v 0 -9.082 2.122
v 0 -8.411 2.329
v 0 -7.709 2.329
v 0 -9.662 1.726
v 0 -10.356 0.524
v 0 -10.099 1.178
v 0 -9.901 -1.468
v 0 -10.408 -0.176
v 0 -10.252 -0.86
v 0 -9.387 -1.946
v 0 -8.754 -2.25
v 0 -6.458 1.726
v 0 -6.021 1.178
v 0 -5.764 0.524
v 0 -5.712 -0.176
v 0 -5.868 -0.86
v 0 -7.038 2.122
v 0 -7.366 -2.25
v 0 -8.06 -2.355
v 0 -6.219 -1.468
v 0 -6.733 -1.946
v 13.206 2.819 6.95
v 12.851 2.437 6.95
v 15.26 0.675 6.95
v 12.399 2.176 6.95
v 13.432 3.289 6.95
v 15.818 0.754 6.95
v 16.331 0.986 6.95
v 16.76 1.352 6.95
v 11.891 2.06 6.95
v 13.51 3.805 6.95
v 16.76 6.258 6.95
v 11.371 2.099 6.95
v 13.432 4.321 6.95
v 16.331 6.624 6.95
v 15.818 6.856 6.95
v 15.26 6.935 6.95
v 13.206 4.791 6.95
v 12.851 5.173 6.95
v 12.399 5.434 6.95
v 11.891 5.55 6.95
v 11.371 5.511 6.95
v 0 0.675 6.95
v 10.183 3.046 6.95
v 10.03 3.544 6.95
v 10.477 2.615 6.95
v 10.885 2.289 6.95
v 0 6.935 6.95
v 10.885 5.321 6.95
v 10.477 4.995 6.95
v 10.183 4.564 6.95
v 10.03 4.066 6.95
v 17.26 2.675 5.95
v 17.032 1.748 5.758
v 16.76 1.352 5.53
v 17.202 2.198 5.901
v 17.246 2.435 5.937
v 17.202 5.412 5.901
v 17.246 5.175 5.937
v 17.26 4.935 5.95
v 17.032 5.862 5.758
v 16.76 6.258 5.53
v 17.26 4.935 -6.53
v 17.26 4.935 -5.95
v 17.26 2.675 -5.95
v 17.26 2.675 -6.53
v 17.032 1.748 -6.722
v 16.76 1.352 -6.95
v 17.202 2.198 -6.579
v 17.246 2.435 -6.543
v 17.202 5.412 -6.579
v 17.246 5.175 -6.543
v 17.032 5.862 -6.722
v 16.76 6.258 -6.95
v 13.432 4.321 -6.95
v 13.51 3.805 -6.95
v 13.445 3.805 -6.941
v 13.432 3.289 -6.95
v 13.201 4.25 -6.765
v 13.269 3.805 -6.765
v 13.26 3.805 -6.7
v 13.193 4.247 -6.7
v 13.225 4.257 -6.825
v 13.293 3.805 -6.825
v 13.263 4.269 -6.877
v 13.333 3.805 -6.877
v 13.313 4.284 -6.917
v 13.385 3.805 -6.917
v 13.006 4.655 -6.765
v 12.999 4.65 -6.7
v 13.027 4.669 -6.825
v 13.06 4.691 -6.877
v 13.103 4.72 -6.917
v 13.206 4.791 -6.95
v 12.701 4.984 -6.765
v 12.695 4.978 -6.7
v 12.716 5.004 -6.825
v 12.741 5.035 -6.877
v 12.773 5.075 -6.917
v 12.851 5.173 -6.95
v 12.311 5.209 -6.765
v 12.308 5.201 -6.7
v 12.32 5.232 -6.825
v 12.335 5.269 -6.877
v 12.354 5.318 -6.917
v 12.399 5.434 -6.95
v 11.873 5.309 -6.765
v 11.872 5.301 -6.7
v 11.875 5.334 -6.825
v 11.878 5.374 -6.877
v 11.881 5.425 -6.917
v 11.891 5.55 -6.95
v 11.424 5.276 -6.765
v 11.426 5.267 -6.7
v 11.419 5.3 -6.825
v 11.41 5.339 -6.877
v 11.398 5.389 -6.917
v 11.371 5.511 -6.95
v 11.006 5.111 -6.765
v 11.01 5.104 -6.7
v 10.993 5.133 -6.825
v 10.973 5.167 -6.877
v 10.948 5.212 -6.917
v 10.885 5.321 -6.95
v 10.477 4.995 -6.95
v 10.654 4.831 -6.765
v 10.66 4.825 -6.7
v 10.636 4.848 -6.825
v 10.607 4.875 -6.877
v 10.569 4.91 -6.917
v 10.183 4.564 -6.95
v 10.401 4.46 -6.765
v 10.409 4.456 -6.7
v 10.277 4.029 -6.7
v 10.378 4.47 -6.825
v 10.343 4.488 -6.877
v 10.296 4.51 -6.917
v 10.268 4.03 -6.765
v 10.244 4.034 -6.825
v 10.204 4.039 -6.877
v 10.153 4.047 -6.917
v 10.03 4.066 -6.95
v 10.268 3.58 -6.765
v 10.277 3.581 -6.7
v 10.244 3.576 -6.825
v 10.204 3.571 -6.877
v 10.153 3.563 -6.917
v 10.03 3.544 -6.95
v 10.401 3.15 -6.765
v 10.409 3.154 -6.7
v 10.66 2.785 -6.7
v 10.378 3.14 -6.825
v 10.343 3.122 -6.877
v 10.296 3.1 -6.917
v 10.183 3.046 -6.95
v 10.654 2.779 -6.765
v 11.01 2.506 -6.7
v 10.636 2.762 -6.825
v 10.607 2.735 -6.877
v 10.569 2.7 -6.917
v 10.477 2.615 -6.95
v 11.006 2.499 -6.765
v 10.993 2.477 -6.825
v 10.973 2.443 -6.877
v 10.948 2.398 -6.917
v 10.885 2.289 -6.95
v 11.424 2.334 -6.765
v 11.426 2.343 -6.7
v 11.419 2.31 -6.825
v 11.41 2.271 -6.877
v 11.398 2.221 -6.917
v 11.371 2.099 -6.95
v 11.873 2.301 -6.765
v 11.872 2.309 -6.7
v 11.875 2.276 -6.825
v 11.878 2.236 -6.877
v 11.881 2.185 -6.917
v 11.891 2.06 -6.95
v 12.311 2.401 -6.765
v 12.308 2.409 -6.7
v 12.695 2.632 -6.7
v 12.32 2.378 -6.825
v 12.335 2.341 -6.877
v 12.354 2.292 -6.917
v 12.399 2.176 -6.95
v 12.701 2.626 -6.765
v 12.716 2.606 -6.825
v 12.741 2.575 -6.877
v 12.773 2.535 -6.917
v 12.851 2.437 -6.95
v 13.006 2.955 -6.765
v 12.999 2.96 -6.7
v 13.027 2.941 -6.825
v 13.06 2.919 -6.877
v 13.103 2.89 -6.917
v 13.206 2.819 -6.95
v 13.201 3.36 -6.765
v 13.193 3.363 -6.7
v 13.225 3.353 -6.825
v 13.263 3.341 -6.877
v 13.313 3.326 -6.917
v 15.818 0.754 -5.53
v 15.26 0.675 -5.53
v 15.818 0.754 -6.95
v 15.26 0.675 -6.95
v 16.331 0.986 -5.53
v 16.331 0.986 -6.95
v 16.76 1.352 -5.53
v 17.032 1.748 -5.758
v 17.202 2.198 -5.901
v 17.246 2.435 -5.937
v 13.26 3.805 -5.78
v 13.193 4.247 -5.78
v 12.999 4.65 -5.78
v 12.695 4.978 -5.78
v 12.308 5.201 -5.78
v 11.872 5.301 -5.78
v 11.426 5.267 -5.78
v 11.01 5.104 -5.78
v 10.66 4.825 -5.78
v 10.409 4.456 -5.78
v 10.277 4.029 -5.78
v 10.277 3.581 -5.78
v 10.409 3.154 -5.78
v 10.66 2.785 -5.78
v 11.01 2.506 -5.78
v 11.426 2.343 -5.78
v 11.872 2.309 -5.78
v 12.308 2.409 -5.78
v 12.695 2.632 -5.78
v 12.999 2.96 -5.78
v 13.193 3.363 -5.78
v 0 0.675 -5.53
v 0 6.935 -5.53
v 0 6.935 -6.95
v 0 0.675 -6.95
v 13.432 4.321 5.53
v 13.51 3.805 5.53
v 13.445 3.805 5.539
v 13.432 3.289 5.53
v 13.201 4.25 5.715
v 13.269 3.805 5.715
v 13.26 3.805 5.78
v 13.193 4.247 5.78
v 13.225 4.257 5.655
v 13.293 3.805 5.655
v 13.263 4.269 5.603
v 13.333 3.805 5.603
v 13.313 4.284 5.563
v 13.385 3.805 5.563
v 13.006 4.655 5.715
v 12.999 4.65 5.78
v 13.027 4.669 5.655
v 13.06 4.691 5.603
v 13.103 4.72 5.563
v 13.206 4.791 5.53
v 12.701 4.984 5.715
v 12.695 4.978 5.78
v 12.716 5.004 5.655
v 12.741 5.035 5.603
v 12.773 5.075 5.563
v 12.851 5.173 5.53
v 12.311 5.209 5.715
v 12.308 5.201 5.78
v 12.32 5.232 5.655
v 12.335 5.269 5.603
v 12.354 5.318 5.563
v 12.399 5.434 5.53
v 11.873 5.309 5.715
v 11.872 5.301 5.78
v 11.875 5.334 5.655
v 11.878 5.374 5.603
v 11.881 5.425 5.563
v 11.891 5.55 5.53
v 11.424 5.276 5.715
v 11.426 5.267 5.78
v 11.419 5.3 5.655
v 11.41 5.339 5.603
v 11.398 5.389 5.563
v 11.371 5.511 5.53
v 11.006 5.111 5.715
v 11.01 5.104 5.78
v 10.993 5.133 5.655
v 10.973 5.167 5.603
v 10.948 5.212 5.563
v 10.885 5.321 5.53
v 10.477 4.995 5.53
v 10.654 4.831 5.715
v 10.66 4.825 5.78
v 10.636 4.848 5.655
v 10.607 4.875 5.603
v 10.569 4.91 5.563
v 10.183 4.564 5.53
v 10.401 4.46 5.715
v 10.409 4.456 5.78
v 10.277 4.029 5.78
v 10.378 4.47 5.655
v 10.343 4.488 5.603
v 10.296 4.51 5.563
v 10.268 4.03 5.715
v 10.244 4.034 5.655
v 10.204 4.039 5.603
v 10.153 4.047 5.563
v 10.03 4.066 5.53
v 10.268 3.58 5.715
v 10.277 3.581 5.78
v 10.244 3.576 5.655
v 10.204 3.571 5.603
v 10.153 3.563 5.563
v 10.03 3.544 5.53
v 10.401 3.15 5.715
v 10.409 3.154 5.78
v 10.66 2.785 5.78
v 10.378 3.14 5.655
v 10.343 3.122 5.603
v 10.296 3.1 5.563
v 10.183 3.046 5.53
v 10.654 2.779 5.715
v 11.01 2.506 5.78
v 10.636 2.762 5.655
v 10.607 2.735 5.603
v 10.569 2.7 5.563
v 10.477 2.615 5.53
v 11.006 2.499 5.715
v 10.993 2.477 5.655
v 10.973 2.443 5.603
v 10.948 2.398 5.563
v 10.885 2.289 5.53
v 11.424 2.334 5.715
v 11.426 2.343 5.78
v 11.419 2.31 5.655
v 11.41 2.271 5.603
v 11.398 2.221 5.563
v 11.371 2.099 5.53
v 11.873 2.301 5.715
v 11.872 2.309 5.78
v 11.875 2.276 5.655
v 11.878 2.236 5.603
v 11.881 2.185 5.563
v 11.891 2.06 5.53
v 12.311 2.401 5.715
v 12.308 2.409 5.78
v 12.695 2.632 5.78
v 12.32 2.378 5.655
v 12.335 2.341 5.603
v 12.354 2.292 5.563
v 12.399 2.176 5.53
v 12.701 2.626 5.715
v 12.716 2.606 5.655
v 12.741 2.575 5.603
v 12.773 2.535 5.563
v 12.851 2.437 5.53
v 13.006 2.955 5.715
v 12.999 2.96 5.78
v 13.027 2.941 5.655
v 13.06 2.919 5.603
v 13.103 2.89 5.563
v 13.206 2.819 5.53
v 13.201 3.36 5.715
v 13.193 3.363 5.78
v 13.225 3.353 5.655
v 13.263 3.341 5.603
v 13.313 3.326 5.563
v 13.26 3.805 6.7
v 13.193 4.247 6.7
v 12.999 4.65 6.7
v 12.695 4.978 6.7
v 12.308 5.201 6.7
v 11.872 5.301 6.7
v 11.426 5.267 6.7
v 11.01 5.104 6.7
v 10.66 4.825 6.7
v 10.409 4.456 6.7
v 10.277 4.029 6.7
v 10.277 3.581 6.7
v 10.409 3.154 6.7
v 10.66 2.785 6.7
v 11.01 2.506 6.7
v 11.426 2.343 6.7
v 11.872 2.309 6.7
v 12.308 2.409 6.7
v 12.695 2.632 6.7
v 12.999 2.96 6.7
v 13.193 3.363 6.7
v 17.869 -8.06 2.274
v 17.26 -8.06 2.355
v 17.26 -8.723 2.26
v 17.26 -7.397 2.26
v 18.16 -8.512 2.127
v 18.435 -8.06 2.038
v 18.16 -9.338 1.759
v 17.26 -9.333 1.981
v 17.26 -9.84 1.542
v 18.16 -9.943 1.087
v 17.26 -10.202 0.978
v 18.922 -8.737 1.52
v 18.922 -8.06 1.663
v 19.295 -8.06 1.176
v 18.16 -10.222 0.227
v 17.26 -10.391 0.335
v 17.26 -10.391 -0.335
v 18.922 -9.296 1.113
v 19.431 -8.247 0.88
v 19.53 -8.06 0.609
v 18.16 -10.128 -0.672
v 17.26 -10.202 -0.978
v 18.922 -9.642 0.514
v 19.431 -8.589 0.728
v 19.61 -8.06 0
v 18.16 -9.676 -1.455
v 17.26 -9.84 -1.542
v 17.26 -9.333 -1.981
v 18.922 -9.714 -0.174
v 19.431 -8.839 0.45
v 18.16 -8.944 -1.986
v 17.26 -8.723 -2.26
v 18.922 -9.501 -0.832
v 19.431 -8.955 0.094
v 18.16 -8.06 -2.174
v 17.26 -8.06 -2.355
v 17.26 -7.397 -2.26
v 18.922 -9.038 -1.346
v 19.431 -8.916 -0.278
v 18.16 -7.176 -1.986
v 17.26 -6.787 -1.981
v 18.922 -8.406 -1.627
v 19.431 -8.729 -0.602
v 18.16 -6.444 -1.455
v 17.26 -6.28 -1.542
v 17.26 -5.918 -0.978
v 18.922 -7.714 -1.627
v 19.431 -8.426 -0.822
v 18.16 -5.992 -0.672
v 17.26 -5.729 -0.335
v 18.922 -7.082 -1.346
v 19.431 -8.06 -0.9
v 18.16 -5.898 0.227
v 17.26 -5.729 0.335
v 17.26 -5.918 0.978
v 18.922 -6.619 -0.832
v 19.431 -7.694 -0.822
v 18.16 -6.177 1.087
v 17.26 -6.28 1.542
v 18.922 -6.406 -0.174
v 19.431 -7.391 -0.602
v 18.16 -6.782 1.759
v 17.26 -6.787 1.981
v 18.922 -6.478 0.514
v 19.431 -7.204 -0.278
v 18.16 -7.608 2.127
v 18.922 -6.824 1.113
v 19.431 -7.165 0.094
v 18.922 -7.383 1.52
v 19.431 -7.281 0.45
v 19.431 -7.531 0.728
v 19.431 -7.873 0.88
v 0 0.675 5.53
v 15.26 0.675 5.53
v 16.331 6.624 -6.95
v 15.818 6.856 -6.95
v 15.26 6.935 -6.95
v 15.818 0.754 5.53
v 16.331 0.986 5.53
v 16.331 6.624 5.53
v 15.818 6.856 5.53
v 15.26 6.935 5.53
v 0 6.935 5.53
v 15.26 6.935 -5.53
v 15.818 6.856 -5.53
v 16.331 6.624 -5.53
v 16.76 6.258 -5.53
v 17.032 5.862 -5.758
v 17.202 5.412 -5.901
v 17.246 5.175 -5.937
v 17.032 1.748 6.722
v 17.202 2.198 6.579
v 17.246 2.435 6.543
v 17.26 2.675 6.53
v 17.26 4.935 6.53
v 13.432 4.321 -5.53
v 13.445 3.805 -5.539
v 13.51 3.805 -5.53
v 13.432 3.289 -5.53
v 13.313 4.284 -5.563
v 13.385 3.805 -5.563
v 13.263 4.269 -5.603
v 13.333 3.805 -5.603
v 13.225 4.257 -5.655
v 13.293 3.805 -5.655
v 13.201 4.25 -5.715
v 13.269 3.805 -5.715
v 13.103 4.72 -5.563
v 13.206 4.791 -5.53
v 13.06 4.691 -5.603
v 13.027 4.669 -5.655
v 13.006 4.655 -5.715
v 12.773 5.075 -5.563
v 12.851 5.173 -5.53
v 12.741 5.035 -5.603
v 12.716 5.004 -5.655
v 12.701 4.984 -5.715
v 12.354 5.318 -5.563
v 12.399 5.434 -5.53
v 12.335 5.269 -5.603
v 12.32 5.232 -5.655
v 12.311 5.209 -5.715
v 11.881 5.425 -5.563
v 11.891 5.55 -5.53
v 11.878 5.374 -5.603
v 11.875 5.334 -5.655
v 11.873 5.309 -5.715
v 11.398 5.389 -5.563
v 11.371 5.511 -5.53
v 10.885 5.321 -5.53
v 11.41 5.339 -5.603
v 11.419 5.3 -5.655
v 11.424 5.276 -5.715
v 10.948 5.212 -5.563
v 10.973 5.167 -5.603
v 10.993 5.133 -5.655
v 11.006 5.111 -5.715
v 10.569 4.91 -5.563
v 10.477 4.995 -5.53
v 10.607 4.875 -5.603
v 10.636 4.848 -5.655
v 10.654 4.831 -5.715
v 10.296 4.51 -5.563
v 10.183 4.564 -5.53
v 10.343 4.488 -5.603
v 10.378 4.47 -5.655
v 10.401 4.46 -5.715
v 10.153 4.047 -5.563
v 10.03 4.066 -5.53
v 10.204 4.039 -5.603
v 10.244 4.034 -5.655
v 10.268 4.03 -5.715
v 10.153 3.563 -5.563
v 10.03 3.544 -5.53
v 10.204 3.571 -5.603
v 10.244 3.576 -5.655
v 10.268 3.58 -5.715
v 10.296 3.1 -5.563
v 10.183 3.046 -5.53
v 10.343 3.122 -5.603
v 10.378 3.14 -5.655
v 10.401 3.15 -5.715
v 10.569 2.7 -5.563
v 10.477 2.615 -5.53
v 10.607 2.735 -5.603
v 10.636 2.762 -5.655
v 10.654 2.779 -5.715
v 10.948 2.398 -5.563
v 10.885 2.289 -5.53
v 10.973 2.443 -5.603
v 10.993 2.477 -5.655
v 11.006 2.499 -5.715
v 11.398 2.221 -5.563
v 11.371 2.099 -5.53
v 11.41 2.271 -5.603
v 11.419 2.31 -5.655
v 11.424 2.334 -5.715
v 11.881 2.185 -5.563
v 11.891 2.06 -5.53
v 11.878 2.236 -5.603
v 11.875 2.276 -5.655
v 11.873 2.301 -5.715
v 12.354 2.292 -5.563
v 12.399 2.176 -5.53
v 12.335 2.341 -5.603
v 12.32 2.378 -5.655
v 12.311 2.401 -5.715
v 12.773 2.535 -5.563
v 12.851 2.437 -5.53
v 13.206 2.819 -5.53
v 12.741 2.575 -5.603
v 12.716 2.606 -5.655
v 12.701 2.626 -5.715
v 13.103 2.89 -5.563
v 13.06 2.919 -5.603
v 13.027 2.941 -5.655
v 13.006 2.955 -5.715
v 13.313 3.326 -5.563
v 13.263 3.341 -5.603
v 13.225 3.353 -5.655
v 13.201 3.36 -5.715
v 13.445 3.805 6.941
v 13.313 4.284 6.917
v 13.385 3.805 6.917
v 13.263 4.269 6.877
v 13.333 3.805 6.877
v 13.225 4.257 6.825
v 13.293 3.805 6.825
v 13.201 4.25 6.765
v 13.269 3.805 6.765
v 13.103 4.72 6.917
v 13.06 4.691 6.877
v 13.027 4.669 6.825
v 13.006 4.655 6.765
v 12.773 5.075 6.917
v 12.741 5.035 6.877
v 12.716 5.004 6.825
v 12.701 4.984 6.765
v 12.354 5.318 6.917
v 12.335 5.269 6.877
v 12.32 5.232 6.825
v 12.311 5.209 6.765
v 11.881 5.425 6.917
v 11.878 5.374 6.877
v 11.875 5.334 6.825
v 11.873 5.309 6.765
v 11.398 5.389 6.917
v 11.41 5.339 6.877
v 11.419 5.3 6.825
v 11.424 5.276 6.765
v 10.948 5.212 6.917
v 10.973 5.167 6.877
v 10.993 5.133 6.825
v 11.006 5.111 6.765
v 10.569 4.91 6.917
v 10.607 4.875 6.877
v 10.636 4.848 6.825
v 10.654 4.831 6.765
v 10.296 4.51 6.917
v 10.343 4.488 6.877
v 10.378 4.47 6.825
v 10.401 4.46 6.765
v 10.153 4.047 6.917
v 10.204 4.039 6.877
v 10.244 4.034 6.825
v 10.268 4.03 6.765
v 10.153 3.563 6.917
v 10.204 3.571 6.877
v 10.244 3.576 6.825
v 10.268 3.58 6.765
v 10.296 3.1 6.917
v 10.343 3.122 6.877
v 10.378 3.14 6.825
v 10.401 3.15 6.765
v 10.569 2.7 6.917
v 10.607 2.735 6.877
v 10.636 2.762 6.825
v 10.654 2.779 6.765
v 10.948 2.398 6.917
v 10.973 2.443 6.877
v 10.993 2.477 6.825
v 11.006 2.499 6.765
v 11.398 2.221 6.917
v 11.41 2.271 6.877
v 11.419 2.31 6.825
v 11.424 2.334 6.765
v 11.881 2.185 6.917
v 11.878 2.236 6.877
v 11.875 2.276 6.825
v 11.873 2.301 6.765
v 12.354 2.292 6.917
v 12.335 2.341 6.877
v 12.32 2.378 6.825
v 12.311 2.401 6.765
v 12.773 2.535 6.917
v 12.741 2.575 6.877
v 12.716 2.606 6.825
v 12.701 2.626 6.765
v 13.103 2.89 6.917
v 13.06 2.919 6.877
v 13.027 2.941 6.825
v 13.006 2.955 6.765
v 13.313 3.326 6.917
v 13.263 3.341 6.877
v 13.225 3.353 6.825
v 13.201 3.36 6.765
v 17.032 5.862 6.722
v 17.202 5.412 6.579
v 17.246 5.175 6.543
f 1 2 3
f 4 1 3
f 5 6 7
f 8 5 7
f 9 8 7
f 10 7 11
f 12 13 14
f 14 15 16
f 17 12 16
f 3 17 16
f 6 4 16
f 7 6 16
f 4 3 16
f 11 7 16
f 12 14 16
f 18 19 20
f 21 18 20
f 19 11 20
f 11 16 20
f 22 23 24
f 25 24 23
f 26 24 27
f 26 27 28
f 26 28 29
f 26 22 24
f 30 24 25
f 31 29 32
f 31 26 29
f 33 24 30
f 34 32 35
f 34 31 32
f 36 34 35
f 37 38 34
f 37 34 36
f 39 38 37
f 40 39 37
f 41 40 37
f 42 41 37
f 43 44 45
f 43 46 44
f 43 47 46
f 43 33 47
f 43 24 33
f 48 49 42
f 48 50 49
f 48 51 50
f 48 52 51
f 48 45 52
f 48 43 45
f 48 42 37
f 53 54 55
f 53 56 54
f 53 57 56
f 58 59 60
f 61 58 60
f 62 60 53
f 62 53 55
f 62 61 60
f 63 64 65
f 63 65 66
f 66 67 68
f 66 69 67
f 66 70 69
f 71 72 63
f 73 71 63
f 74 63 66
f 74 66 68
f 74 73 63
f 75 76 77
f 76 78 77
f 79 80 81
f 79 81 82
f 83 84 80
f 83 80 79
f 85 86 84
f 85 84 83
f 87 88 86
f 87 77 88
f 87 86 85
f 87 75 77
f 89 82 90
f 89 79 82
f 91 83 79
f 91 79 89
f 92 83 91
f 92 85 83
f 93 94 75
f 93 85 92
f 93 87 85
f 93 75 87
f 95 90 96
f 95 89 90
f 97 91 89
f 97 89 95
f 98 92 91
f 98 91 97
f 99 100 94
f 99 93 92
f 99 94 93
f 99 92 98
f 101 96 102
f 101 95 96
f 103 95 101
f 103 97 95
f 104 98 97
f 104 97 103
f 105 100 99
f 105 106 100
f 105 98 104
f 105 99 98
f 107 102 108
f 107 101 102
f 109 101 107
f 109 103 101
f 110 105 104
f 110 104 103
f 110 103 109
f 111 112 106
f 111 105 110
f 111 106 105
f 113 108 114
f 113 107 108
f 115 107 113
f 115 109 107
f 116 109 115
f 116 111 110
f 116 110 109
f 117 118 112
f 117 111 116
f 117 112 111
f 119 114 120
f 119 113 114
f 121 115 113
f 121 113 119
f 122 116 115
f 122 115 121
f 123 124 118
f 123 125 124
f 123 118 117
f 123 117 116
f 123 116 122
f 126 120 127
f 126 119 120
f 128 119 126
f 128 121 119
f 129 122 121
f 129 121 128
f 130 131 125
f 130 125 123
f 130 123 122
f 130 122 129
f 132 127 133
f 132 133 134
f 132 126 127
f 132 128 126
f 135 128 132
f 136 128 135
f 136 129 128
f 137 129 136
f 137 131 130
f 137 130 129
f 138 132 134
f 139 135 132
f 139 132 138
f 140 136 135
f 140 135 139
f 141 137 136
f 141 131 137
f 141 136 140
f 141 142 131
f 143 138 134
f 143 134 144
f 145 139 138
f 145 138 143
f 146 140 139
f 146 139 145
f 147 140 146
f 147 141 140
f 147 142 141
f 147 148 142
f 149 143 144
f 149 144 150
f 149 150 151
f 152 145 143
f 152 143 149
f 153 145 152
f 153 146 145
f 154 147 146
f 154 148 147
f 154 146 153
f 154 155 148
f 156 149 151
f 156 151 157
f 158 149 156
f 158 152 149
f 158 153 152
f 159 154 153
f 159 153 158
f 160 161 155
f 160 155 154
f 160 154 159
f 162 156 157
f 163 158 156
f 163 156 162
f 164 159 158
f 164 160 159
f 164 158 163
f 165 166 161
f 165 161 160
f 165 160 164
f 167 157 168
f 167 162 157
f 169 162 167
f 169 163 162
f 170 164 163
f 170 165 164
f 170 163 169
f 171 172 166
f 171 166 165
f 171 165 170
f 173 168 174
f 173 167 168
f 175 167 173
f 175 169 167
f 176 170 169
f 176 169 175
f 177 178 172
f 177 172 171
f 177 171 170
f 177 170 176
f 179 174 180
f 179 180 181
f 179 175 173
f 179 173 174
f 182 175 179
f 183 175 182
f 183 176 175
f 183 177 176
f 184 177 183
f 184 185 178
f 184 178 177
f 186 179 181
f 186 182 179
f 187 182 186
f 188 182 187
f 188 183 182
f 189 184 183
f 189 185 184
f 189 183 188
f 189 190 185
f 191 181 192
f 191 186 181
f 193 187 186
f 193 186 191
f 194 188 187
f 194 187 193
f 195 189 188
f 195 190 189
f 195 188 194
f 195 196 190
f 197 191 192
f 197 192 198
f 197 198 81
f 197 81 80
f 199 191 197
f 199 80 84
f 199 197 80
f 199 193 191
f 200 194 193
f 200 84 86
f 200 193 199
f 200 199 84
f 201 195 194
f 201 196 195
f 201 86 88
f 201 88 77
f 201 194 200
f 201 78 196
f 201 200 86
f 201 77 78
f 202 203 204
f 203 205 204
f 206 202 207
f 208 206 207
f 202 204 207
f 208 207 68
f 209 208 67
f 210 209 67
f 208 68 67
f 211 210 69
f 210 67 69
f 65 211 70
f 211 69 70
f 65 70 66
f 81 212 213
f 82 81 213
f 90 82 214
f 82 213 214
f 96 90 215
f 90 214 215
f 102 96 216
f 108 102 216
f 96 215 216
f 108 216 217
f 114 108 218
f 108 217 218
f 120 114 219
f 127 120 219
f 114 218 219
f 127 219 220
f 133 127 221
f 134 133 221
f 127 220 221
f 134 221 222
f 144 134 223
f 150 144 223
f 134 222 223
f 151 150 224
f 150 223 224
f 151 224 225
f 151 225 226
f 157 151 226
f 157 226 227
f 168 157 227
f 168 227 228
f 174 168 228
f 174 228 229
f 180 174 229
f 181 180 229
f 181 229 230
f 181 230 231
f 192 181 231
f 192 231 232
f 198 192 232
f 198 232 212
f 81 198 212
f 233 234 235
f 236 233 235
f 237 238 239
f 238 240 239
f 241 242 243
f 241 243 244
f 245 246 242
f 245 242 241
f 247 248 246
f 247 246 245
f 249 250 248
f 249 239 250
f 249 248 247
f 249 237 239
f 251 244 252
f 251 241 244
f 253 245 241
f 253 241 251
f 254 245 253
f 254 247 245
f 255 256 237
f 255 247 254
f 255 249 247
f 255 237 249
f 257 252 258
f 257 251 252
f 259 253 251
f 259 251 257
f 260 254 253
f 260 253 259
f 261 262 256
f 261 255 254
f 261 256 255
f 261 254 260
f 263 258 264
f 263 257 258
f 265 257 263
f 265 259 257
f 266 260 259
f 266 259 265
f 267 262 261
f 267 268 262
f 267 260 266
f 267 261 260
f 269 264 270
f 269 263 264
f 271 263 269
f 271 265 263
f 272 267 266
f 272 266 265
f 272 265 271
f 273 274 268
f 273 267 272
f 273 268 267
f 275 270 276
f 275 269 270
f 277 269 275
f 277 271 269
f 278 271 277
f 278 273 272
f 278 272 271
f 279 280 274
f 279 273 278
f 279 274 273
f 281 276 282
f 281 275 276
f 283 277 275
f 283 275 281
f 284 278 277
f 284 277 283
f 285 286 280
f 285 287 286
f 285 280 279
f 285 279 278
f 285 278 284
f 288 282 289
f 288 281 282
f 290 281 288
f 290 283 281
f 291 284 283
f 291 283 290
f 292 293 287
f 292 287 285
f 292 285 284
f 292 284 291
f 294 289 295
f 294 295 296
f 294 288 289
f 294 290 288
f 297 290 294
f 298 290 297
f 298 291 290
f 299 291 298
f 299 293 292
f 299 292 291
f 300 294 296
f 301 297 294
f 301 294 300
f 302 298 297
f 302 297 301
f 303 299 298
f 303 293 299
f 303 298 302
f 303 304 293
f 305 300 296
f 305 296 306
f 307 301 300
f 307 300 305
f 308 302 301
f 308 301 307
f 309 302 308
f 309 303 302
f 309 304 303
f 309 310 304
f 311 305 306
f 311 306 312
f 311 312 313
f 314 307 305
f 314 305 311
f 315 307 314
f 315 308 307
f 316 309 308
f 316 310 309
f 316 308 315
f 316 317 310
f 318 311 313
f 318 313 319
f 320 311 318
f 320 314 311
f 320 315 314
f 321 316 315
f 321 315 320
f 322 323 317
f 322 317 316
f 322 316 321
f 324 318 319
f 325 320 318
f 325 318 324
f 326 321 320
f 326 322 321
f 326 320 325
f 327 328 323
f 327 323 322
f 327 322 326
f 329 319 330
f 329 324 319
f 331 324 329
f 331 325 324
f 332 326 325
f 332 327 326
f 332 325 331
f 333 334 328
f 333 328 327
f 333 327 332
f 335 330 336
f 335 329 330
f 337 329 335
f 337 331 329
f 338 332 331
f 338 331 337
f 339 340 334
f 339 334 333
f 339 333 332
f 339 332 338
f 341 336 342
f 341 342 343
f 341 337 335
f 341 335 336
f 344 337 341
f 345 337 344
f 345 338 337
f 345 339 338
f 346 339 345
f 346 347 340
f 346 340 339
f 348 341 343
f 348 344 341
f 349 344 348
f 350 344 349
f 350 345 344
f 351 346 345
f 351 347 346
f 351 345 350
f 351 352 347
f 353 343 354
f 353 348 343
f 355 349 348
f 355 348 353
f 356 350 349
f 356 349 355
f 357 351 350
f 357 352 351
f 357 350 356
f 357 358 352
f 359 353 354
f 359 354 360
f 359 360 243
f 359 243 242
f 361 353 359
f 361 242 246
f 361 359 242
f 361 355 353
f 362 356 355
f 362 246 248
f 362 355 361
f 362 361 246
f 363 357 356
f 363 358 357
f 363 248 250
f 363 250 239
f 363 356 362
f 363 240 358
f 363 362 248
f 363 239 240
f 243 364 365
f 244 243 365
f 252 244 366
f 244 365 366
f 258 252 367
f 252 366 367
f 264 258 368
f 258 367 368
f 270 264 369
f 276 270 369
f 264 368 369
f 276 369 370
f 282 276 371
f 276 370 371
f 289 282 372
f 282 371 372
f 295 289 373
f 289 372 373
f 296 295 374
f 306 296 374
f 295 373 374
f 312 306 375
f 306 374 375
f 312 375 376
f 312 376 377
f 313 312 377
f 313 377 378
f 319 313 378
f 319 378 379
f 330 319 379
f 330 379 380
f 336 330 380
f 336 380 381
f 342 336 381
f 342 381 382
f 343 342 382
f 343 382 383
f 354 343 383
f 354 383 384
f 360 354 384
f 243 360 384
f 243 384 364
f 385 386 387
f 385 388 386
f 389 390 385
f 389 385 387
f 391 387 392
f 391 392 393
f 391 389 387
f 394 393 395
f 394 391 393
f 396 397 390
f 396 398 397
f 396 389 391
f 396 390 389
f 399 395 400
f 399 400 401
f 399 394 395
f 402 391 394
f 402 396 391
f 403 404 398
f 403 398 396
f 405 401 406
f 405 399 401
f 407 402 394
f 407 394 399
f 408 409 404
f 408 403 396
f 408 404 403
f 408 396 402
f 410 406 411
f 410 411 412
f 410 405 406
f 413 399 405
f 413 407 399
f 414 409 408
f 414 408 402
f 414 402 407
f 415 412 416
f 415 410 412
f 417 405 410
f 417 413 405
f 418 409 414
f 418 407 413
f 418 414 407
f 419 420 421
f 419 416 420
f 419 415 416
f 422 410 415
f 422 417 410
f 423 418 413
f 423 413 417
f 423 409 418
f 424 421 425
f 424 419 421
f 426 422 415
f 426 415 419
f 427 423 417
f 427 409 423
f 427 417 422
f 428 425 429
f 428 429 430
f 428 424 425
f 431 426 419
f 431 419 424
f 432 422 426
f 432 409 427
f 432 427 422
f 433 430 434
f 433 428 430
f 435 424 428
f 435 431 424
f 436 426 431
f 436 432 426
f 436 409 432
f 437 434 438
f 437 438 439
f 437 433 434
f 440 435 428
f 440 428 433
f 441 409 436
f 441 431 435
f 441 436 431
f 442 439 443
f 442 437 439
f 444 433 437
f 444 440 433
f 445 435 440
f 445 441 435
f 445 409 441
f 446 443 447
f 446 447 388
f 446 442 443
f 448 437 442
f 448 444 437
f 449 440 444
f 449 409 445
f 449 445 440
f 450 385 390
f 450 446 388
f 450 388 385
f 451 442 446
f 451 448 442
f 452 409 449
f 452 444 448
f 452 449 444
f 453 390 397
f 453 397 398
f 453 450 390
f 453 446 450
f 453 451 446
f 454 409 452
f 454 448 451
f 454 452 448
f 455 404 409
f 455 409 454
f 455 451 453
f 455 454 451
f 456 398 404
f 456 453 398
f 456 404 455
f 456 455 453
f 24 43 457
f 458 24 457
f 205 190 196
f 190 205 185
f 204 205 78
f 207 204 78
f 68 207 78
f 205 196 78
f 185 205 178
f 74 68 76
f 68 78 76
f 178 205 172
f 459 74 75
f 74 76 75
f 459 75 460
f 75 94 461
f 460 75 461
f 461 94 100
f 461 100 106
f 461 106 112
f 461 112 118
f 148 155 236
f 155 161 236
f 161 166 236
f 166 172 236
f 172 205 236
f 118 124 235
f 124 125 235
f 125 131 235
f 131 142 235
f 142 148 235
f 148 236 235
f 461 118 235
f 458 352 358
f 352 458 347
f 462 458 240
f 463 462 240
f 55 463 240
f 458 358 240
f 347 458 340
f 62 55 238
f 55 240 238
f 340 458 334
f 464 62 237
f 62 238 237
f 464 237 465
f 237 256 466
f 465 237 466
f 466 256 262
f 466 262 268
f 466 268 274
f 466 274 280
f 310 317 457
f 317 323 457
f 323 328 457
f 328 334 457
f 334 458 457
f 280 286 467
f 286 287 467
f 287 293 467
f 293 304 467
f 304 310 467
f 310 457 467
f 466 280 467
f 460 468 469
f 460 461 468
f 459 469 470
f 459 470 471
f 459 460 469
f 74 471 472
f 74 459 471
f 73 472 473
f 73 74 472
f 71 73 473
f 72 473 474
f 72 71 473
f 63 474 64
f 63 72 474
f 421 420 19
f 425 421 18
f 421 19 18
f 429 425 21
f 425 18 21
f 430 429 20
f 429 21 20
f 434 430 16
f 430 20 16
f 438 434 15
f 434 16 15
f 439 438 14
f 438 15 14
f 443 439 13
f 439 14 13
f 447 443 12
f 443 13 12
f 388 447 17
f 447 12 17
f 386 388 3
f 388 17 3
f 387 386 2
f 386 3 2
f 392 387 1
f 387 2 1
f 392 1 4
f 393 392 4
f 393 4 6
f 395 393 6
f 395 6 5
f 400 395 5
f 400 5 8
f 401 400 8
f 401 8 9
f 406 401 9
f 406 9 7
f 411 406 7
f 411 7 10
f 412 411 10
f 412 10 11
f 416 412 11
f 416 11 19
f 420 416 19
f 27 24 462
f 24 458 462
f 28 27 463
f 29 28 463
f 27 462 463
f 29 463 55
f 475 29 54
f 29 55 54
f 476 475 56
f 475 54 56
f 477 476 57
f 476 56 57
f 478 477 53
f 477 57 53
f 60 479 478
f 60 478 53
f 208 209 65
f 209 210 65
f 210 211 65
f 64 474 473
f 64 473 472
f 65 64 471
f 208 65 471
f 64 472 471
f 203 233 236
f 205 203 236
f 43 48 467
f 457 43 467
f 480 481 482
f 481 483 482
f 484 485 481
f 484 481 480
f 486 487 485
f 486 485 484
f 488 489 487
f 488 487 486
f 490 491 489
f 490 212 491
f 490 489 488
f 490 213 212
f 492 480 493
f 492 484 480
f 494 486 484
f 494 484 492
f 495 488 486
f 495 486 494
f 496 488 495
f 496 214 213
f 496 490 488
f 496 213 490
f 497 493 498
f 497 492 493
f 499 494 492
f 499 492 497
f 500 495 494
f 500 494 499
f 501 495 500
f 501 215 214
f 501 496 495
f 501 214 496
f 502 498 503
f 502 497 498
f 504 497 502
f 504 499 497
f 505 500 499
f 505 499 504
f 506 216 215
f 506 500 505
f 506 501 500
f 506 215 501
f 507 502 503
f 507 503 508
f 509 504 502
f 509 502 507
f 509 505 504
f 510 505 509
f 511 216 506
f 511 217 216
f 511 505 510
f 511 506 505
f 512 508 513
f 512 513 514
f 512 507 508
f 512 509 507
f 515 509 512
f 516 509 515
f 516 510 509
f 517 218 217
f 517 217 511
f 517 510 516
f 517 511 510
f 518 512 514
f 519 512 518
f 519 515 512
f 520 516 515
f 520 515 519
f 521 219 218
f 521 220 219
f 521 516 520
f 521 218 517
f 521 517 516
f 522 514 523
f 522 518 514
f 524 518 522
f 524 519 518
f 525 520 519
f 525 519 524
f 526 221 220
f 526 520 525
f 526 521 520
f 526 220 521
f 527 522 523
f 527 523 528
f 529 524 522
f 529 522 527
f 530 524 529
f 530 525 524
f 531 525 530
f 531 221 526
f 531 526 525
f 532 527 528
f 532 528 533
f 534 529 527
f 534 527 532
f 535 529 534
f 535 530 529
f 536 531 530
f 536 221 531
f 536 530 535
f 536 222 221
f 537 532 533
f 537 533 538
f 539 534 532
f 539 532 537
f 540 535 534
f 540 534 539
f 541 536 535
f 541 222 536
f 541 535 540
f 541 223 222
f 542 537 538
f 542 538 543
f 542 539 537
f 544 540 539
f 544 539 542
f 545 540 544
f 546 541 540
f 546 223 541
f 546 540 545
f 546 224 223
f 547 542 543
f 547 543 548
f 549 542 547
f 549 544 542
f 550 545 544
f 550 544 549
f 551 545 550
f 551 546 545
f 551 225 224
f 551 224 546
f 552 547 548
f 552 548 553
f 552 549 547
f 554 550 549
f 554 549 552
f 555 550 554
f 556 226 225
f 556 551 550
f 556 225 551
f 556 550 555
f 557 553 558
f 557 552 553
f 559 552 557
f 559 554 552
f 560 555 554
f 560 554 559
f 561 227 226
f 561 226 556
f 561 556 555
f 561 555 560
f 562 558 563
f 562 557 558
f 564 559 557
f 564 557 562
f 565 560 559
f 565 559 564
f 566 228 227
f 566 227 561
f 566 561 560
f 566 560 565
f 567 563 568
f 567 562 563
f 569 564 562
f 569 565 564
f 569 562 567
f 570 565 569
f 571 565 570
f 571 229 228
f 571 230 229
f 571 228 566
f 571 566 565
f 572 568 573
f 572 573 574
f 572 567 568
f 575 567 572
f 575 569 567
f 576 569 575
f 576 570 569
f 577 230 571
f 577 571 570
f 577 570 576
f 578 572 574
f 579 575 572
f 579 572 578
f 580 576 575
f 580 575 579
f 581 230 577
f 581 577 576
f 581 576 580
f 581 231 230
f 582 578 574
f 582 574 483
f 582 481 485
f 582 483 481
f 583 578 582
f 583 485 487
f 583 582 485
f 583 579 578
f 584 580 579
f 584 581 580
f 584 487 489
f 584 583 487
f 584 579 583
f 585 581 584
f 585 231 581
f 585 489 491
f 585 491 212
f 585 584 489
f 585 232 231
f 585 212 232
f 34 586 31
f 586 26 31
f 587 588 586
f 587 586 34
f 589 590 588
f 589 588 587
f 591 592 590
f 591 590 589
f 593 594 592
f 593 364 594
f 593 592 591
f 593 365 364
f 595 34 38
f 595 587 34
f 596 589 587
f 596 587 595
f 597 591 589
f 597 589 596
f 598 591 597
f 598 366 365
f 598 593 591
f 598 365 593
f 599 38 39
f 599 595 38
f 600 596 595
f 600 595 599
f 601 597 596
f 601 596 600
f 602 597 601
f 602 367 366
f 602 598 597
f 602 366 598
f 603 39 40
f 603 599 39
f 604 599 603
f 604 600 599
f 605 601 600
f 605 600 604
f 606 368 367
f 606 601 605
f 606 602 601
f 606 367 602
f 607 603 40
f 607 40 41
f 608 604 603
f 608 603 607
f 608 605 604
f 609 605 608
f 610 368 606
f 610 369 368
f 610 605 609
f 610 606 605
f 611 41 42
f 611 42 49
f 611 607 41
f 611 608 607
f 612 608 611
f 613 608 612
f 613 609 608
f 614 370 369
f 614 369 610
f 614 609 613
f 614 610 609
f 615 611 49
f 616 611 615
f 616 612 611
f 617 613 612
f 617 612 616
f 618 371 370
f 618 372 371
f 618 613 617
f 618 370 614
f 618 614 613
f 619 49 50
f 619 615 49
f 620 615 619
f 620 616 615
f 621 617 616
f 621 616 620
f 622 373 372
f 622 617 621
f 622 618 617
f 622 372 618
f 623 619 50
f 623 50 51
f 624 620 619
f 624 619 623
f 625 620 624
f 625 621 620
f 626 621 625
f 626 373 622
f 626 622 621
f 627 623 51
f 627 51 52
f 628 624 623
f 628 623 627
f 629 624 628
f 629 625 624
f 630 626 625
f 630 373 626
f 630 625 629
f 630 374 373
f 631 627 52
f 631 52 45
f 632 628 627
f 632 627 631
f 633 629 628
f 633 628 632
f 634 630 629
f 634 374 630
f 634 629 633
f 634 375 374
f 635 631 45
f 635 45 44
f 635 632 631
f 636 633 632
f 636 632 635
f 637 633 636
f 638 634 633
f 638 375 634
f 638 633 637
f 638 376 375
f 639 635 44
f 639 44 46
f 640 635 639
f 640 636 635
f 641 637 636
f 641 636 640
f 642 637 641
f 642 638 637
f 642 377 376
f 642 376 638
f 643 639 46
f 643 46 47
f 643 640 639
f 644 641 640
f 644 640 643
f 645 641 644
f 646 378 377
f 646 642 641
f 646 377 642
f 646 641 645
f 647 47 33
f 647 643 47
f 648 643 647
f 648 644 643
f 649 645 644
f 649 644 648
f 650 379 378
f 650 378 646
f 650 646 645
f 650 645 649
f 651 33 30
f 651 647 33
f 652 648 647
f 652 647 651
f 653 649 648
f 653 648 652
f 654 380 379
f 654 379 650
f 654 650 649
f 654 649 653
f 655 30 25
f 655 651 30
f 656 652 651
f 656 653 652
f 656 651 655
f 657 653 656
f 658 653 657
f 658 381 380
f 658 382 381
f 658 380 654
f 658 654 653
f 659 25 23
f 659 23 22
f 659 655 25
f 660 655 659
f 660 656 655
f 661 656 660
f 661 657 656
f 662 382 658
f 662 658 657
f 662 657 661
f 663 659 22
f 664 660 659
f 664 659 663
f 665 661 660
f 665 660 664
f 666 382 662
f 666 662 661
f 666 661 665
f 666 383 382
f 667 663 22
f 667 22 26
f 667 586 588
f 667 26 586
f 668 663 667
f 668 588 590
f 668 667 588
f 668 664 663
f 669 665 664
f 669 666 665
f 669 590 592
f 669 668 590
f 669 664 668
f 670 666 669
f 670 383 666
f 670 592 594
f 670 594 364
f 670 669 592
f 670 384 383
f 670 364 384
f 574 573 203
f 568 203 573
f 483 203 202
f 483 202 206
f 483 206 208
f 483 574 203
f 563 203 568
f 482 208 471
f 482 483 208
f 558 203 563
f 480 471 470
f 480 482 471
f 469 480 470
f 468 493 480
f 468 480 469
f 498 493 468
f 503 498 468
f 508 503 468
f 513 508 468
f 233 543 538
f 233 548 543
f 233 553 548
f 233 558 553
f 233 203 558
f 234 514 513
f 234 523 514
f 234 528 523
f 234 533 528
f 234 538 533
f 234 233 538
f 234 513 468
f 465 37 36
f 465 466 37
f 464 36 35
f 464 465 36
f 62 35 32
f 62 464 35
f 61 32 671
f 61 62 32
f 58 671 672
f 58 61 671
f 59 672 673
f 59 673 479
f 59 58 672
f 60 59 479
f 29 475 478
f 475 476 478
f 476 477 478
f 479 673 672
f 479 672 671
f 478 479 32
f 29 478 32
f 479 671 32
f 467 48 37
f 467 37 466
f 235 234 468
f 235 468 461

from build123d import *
from OCP.BRepFilletAPI import BRepFilletAPI_MakeChamfer

# Parameters (mm, degrees)
SKETCH1_R             = 2.355
BOSS_EXTRUDE1_DEPTH   = 17.26
SKETCH1_W             = 1.42
SKETCH1_H             = 6.26
BOSS_EXTRUDE1_2_DEPTH = 17.26
BOSS_EXTRUDE1_3_DEPTH = 17.26
CHAMFER1_SIZE         = 0.5
CHAMFER1_SIZE2        = 0.419549816
CHAMFER2_SIZE         = 0.5
CHAMFER2_SIZE2        = 0.419549816
FILLET1_R             = 2
FILLET2_R             = 2
DOME1_FACE_RADIUS     = 2.355
DOME1_HEIGHT          = 2.35
SKETCH2_R             = 1.5
CUT_EXTRUDE1_DEPTH    = 21
FILLET3_R             = 0.25
FILLET4_R             = 0.25


with BuildPart() as part:
    # Sketch1 → Boss-Extrude1 (new body)
    with BuildSketch(Plane(origin=(0, 0, 0), x_dir=(0, 0, -1), z_dir=(1, 0, 0))):
        with Locations((0, -8.06)):
            Circle(SKETCH1_R)
    extrude(amount=BOSS_EXTRUDE1_DEPTH)

    # Dome1: a dome of height H over a round flat face of radius A is a cap of a sphere of radius (A * A + H * H) / (2 * H)
    dome1_r = (DOME1_FACE_RADIUS * DOME1_FACE_RADIUS + DOME1_HEIGHT * DOME1_HEIGHT) / (2 * DOME1_HEIGHT)
    dome1_base = Plane((17.26, -8.06, 0), z_dir=(1, 0, 0))
    with Locations(dome1_base.offset(DOME1_HEIGHT - dome1_r)):
        dome1_ball = Sphere(dome1_r, mode=Mode.PRIVATE)
    add(split(dome1_ball, bisect_by=dome1_base, keep=Keep.TOP, mode=Mode.PRIVATE))


with BuildPart() as body_2:
    # Sketch1 → Boss-Extrude1 2 (new body)
    with BuildSketch(Plane(origin=(0, 0, 0), x_dir=(0, 0, -1), z_dir=(1, 0, 0))):
        with Locations((6.24, 3.805)):
            Rectangle(SKETCH1_W, SKETCH1_H)
    extrude(amount=BOSS_EXTRUDE1_2_DEPTH)

    # Chamfer2: one chamfer whose edges measure the first distance from different faces: ONE call of the kernel's chamfer builder (chamfer() names one face for all edges)
    chamfer2_edges_1 = [body_2.edges().sort_by_distance(p)[0] for p in [
        (17.26, 3.805, -5.53),
    ]]
    chamfer2_side_1 = [body_2.faces().sort_by_distance(p)[0] for p in [
        (8.63, 3.805, -5.53),
    ]]
    chamfer2_edges_2 = [body_2.edges().sort_by_distance(p)[0] for p in [
        (17.26, 3.805, -6.95),
    ]]
    chamfer2_side_2 = [body_2.faces().sort_by_distance(p)[0] for p in [
        (8.63, 3.805, -6.95),
    ]]
    chamfer2 = BRepFilletAPI_MakeChamfer(body_2.part.solid().wrapped)
    for e in chamfer2_edges_1:
        chamfer2.Add(CHAMFER2_SIZE, CHAMFER2_SIZE2, e.wrapped, chamfer2_side_1[0].wrapped)  # the first distance lies on this face
    for e in chamfer2_edges_2:
        chamfer2.Add(CHAMFER2_SIZE, CHAMFER2_SIZE2, e.wrapped, chamfer2_side_2[0].wrapped)  # the first distance lies on this face
    add(Compound.cast(chamfer2.Shape()), mode=Mode.REPLACE)

    # Fillet2
    fillet2_edges = [body_2.edges().sort_by_distance(p)[0] for p in [
        (17.26, 0.675, -6.24),
        (17.26, 6.935, -6.24),
    ]]
    fillet(fillet2_edges, radius=FILLET2_R)


with BuildPart() as body_3:
    # Sketch1 → Boss-Extrude1 3 (new body)
    with BuildSketch(Plane(origin=(0, 0, 0), x_dir=(0, 0, -1), z_dir=(1, 0, 0))):
        with Locations((-6.24, 3.805)):
            Rectangle(SKETCH1_W, SKETCH1_H)
    extrude(amount=BOSS_EXTRUDE1_3_DEPTH)

    # Chamfer1: one chamfer whose edges measure the first distance from different faces: ONE call of the kernel's chamfer builder (chamfer() names one face for all edges)
    chamfer1_edges_1 = [body_3.edges().sort_by_distance(p)[0] for p in [
        (17.26, 3.805, 6.95),
    ]]
    chamfer1_side_1 = [body_3.faces().sort_by_distance(p)[0] for p in [
        (8.63, 3.805, 6.95),
    ]]
    chamfer1_edges_2 = [body_3.edges().sort_by_distance(p)[0] for p in [
        (17.26, 3.805, 5.53),
    ]]
    chamfer1_side_2 = [body_3.faces().sort_by_distance(p)[0] for p in [
        (8.63, 3.805, 5.53),
    ]]
    chamfer1 = BRepFilletAPI_MakeChamfer(body_3.part.solid().wrapped)
    for e in chamfer1_edges_1:
        chamfer1.Add(CHAMFER1_SIZE, CHAMFER1_SIZE2, e.wrapped, chamfer1_side_1[0].wrapped)  # the first distance lies on this face
    for e in chamfer1_edges_2:
        chamfer1.Add(CHAMFER1_SIZE, CHAMFER1_SIZE2, e.wrapped, chamfer1_side_2[0].wrapped)  # the first distance lies on this face
    add(Compound.cast(chamfer1.Shape()), mode=Mode.REPLACE)

    # Fillet1
    fillet1_edges = [body_3.edges().sort_by_distance(p)[0] for p in [
        (17.26, 6.935, 6.24),
        (17.26, 0.675, 6.24),
    ]]
    fillet(fillet1_edges, radius=FILLET1_R)


with BuildPart() as cut_extrude1_tool:
    # Sketch2 → Cut-Extrude1 (new body)
    with BuildSketch(Plane.XY.offset(6.95)):
        with Locations((11.76, 3.805)):
            Circle(SKETCH2_R)
    extrude(amount=-CUT_EXTRUDE1_DEPTH)


with BuildPart() as body_2_1:
    add(body_2.part)

    # Cut-Extrude1: cut by cut_extrude1_tool
    add(cut_extrude1_tool.part, mode=Mode.SUBTRACT)

    # Fillet3
    fillet3_edges = [body_2_1.edges().sort_by_distance(p)[0] for p in [
        (10.26, 3.805, -5.53),
        (10.26, 3.805, -6.95),
    ]]
    fillet(fillet3_edges, radius=FILLET3_R)


with BuildPart() as body_3_1:
    add(body_3.part)

    # Cut-Extrude1: cut by cut_extrude1_tool
    add(cut_extrude1_tool.part, mode=Mode.SUBTRACT)

    # Fillet4
    fillet4_edges = [body_3_1.edges().sort_by_distance(p)[0] for p in [
        (10.26, 3.805, 5.53),
        (10.26, 3.805, 6.95),
    ]]
    fillet(fillet4_edges, radius=FILLET4_R)


solid = Compound([part.part, body_2_1.part, body_3_1.part])
